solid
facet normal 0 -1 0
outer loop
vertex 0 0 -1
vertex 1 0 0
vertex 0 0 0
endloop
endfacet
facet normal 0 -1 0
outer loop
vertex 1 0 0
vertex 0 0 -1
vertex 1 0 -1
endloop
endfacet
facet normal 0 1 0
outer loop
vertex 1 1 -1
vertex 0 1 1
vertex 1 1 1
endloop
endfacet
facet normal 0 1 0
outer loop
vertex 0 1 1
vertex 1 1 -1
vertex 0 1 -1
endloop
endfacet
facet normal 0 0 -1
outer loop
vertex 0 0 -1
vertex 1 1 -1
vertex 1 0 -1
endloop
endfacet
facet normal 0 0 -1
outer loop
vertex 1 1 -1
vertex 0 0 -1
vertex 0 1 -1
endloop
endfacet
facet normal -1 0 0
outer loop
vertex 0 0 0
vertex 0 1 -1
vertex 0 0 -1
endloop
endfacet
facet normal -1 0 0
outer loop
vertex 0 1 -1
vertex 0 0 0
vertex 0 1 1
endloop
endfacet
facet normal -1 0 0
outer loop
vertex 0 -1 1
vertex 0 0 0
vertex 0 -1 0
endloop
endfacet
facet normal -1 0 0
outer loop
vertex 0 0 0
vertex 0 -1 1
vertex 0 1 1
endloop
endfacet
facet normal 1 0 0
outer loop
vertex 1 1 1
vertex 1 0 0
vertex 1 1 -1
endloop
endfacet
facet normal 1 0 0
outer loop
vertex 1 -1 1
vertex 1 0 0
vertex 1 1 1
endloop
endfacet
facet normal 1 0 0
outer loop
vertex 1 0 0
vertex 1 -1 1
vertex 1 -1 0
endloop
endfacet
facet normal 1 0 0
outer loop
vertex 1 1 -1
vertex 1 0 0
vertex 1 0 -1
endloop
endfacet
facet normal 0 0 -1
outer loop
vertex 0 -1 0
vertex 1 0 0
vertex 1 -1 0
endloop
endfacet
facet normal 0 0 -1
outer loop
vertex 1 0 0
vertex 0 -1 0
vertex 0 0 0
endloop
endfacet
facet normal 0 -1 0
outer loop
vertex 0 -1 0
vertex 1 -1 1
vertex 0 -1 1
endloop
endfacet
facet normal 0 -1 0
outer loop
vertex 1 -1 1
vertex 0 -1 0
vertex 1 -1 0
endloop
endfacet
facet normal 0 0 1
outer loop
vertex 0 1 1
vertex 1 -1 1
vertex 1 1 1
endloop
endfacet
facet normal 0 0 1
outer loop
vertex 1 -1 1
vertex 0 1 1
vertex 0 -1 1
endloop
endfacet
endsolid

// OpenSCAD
rotate(180, [1,1,0]) cube(1);
rotate(180,[1,0,1]) cube(1);
rotate(120,[1,1,1]) cube(1);
rotate(540,[2,0,2]) cube(1);
rotate(179.99999,[1,1,0]) cube(1);
